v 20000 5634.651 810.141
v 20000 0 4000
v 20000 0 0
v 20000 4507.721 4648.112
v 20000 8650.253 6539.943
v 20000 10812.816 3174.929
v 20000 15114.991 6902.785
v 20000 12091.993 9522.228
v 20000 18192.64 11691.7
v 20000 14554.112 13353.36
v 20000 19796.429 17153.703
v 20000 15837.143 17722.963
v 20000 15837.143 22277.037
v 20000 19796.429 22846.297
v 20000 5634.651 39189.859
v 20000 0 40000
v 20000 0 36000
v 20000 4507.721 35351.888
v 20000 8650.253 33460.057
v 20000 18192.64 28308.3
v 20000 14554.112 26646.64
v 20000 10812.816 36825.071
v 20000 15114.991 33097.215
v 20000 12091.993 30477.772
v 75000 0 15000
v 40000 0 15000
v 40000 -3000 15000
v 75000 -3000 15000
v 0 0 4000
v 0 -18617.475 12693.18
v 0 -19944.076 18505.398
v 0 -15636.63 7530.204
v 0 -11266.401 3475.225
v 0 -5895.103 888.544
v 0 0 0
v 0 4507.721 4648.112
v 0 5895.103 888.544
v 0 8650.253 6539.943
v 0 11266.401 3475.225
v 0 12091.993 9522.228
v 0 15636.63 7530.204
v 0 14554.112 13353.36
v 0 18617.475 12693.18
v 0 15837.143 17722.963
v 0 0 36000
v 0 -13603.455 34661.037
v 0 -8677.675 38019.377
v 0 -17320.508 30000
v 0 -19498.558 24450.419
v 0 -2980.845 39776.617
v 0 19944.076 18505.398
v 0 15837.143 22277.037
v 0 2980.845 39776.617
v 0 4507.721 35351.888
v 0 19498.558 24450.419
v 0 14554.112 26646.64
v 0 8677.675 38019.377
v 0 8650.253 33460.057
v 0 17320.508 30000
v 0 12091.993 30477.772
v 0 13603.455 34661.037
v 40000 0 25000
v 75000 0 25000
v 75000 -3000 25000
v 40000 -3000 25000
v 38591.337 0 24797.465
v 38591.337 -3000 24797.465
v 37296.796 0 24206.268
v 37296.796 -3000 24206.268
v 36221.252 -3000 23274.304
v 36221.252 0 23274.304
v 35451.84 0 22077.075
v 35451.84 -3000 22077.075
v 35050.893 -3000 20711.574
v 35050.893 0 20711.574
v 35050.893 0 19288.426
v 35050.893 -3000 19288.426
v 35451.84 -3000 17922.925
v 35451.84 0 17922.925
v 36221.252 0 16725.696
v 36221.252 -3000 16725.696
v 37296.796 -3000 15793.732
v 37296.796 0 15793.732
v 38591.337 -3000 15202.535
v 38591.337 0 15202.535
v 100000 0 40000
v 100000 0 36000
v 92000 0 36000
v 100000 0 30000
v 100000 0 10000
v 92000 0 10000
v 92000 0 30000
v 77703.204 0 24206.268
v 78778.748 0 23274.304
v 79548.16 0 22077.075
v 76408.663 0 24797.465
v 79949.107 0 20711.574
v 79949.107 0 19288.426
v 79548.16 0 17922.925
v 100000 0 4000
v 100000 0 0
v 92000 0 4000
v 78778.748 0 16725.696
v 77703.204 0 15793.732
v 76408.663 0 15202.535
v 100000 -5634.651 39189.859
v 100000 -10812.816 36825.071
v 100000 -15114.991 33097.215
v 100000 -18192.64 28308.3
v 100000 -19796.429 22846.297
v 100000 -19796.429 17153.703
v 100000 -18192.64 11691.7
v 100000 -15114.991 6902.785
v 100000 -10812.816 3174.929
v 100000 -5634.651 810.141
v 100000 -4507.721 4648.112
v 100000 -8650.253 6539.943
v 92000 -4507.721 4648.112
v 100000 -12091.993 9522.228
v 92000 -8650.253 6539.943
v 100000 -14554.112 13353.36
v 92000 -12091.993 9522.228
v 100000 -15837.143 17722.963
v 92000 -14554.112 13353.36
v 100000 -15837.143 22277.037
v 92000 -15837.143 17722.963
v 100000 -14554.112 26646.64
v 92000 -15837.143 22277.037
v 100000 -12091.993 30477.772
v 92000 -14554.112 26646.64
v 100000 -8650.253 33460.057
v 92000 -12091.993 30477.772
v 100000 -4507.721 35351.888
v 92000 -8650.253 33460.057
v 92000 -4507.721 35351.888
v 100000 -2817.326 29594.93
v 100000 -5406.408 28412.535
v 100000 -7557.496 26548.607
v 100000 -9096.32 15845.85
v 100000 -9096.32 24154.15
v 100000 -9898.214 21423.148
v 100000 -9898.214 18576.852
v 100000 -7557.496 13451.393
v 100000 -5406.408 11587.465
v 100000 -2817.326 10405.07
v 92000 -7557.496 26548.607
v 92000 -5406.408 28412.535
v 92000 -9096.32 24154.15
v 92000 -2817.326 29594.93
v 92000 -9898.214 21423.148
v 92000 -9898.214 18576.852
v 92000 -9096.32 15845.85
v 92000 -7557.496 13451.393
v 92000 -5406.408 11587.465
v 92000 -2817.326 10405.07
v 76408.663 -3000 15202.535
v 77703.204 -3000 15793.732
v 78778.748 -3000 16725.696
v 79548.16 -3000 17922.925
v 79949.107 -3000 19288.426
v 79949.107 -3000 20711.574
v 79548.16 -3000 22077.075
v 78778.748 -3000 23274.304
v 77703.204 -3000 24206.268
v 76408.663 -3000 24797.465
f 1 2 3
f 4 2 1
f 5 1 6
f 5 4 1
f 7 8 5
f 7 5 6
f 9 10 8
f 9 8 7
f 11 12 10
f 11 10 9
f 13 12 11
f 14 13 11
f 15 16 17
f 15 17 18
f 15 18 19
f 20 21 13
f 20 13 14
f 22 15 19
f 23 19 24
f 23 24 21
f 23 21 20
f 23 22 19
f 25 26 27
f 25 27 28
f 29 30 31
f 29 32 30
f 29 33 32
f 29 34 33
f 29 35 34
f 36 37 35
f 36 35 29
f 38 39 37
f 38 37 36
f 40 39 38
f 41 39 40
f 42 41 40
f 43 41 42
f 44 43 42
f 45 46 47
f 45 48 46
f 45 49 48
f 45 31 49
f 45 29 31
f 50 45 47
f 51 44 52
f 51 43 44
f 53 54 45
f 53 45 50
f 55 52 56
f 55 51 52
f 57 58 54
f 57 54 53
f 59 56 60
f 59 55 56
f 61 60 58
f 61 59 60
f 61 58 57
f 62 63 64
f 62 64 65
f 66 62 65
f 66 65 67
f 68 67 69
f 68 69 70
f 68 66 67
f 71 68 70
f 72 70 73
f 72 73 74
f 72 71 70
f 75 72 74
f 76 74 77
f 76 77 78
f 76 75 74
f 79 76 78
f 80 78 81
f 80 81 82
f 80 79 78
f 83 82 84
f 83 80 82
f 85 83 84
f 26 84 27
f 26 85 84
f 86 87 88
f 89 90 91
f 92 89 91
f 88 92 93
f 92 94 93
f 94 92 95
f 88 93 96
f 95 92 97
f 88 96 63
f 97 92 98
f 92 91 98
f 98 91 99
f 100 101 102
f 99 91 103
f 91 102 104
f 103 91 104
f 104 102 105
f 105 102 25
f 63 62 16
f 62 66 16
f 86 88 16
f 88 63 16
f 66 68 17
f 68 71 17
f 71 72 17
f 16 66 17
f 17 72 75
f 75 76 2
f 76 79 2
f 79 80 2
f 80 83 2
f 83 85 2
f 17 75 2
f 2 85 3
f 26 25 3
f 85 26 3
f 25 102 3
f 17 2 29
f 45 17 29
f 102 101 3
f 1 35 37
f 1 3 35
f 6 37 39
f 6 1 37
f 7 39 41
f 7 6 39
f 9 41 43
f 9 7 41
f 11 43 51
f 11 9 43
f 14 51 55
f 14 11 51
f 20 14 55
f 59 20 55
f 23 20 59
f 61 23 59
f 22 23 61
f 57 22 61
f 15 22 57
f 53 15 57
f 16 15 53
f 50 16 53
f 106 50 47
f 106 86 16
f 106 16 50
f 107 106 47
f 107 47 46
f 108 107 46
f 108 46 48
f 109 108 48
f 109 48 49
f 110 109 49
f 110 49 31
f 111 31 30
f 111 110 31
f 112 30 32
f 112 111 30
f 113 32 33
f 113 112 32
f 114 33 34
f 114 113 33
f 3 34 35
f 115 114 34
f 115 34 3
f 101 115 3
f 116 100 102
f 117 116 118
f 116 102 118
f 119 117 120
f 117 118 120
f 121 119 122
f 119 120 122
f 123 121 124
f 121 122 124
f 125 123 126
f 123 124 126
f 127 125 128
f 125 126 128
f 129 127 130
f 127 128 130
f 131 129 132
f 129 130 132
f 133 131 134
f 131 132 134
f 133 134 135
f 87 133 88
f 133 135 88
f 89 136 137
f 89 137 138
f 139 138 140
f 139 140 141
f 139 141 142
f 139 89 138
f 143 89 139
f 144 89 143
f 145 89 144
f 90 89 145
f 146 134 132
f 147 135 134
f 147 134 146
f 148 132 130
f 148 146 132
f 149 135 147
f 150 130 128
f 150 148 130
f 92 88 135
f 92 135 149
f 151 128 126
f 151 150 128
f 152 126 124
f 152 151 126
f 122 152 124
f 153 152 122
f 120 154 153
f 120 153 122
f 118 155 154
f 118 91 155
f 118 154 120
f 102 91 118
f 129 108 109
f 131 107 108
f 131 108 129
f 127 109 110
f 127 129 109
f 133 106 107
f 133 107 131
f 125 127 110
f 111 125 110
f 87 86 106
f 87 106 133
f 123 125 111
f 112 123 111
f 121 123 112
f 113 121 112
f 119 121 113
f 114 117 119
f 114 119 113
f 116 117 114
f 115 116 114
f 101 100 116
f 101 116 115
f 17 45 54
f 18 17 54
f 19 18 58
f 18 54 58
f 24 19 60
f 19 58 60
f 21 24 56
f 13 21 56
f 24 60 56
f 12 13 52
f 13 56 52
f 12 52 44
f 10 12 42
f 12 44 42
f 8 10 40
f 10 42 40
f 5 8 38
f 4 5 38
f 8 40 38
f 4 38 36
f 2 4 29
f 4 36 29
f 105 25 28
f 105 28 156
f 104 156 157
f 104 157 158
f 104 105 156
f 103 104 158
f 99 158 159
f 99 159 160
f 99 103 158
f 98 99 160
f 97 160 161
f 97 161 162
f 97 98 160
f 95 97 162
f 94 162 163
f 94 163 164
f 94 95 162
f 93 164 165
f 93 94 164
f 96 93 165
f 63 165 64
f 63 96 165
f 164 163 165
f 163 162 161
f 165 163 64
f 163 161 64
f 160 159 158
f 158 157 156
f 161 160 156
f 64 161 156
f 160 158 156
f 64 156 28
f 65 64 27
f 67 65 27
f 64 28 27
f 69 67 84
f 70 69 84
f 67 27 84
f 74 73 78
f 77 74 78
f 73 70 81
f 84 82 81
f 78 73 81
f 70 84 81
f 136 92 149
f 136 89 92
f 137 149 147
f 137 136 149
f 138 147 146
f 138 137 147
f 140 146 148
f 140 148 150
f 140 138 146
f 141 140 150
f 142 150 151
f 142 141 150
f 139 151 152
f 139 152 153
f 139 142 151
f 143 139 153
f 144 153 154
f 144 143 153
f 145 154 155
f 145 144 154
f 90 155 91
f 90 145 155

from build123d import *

# Parameters (mm, degrees)
CUT_EXTRUDE1_DEPTH      = 3000
CUT_EXTRUDE3_DEPTH      = 100000
SKETCH6_W               = 80000
SKETCH6_H               = 20000
CUT_EXTRUDE4_DEPTH      = 25001
CUT_EXTRUDE4_DEPTH_BACK = 15001


with BuildPart() as part:
    # Sketch1 → Revolve4 (revolve)
    with BuildSketch(Plane(origin=(0, 0, 0), x_dir=(1, 0, 0), z_dir=(0, 1, 0))):
        Polygon((0, 0), (100000, 0), (100000, -4000), (92000, -4000), (92000, -10000), (100000, -10000), (100000, -20000), (80000, -20000), (0, -20000), align=None)
    revolve(axis=Axis((80000, 0, 20000), (1, 0, 0)))

    # Sketch3 → Cut-Extrude1 (cut)
    with BuildSketch(Plane(origin=(0, 0, 0), x_dir=(1, 0, 0), z_dir=(0, 1, 0))):
        with BuildLine():
            Line((40000, -15000), (75000, -15000))
            ThreePointArc((75000, -15000), (80000, -20000), (75000, -25000))
            Line((75000, -25000), (40000, -25000))
            ThreePointArc((40000, -25000), (35000, -20000), (40000, -15000))
        make_face()
    extrude(amount=-CUT_EXTRUDE1_DEPTH, mode=Mode.SUBTRACT)

    # Sketch5 → Cut-Extrude3 (cut)
    with BuildSketch(Plane.ZY):
        with BuildLine():
            Line((4000, 0), (36000, 0))
            ThreePointArc((36000, 0), (20000, 16000), (4000, 0))
        make_face()
    extrude(amount=-CUT_EXTRUDE3_DEPTH, mode=Mode.SUBTRACT)

    # Sketch6 → Cut-Extrude4 (cut, two sides)
    with BuildSketch(Plane(origin=(0, 0, 25000), x_dir=(-1, 0, 0), z_dir=(0, 0, -1))) as cut_extrude4_sk:
        with Locations((-60000, 10000)):
            Rectangle(SKETCH6_W, SKETCH6_H)
    extrude(amount=CUT_EXTRUDE4_DEPTH, mode=Mode.SUBTRACT)
    extrude(cut_extrude4_sk.sketch, amount=-CUT_EXTRUDE4_DEPTH_BACK, mode=Mode.SUBTRACT)


solid = part.part
